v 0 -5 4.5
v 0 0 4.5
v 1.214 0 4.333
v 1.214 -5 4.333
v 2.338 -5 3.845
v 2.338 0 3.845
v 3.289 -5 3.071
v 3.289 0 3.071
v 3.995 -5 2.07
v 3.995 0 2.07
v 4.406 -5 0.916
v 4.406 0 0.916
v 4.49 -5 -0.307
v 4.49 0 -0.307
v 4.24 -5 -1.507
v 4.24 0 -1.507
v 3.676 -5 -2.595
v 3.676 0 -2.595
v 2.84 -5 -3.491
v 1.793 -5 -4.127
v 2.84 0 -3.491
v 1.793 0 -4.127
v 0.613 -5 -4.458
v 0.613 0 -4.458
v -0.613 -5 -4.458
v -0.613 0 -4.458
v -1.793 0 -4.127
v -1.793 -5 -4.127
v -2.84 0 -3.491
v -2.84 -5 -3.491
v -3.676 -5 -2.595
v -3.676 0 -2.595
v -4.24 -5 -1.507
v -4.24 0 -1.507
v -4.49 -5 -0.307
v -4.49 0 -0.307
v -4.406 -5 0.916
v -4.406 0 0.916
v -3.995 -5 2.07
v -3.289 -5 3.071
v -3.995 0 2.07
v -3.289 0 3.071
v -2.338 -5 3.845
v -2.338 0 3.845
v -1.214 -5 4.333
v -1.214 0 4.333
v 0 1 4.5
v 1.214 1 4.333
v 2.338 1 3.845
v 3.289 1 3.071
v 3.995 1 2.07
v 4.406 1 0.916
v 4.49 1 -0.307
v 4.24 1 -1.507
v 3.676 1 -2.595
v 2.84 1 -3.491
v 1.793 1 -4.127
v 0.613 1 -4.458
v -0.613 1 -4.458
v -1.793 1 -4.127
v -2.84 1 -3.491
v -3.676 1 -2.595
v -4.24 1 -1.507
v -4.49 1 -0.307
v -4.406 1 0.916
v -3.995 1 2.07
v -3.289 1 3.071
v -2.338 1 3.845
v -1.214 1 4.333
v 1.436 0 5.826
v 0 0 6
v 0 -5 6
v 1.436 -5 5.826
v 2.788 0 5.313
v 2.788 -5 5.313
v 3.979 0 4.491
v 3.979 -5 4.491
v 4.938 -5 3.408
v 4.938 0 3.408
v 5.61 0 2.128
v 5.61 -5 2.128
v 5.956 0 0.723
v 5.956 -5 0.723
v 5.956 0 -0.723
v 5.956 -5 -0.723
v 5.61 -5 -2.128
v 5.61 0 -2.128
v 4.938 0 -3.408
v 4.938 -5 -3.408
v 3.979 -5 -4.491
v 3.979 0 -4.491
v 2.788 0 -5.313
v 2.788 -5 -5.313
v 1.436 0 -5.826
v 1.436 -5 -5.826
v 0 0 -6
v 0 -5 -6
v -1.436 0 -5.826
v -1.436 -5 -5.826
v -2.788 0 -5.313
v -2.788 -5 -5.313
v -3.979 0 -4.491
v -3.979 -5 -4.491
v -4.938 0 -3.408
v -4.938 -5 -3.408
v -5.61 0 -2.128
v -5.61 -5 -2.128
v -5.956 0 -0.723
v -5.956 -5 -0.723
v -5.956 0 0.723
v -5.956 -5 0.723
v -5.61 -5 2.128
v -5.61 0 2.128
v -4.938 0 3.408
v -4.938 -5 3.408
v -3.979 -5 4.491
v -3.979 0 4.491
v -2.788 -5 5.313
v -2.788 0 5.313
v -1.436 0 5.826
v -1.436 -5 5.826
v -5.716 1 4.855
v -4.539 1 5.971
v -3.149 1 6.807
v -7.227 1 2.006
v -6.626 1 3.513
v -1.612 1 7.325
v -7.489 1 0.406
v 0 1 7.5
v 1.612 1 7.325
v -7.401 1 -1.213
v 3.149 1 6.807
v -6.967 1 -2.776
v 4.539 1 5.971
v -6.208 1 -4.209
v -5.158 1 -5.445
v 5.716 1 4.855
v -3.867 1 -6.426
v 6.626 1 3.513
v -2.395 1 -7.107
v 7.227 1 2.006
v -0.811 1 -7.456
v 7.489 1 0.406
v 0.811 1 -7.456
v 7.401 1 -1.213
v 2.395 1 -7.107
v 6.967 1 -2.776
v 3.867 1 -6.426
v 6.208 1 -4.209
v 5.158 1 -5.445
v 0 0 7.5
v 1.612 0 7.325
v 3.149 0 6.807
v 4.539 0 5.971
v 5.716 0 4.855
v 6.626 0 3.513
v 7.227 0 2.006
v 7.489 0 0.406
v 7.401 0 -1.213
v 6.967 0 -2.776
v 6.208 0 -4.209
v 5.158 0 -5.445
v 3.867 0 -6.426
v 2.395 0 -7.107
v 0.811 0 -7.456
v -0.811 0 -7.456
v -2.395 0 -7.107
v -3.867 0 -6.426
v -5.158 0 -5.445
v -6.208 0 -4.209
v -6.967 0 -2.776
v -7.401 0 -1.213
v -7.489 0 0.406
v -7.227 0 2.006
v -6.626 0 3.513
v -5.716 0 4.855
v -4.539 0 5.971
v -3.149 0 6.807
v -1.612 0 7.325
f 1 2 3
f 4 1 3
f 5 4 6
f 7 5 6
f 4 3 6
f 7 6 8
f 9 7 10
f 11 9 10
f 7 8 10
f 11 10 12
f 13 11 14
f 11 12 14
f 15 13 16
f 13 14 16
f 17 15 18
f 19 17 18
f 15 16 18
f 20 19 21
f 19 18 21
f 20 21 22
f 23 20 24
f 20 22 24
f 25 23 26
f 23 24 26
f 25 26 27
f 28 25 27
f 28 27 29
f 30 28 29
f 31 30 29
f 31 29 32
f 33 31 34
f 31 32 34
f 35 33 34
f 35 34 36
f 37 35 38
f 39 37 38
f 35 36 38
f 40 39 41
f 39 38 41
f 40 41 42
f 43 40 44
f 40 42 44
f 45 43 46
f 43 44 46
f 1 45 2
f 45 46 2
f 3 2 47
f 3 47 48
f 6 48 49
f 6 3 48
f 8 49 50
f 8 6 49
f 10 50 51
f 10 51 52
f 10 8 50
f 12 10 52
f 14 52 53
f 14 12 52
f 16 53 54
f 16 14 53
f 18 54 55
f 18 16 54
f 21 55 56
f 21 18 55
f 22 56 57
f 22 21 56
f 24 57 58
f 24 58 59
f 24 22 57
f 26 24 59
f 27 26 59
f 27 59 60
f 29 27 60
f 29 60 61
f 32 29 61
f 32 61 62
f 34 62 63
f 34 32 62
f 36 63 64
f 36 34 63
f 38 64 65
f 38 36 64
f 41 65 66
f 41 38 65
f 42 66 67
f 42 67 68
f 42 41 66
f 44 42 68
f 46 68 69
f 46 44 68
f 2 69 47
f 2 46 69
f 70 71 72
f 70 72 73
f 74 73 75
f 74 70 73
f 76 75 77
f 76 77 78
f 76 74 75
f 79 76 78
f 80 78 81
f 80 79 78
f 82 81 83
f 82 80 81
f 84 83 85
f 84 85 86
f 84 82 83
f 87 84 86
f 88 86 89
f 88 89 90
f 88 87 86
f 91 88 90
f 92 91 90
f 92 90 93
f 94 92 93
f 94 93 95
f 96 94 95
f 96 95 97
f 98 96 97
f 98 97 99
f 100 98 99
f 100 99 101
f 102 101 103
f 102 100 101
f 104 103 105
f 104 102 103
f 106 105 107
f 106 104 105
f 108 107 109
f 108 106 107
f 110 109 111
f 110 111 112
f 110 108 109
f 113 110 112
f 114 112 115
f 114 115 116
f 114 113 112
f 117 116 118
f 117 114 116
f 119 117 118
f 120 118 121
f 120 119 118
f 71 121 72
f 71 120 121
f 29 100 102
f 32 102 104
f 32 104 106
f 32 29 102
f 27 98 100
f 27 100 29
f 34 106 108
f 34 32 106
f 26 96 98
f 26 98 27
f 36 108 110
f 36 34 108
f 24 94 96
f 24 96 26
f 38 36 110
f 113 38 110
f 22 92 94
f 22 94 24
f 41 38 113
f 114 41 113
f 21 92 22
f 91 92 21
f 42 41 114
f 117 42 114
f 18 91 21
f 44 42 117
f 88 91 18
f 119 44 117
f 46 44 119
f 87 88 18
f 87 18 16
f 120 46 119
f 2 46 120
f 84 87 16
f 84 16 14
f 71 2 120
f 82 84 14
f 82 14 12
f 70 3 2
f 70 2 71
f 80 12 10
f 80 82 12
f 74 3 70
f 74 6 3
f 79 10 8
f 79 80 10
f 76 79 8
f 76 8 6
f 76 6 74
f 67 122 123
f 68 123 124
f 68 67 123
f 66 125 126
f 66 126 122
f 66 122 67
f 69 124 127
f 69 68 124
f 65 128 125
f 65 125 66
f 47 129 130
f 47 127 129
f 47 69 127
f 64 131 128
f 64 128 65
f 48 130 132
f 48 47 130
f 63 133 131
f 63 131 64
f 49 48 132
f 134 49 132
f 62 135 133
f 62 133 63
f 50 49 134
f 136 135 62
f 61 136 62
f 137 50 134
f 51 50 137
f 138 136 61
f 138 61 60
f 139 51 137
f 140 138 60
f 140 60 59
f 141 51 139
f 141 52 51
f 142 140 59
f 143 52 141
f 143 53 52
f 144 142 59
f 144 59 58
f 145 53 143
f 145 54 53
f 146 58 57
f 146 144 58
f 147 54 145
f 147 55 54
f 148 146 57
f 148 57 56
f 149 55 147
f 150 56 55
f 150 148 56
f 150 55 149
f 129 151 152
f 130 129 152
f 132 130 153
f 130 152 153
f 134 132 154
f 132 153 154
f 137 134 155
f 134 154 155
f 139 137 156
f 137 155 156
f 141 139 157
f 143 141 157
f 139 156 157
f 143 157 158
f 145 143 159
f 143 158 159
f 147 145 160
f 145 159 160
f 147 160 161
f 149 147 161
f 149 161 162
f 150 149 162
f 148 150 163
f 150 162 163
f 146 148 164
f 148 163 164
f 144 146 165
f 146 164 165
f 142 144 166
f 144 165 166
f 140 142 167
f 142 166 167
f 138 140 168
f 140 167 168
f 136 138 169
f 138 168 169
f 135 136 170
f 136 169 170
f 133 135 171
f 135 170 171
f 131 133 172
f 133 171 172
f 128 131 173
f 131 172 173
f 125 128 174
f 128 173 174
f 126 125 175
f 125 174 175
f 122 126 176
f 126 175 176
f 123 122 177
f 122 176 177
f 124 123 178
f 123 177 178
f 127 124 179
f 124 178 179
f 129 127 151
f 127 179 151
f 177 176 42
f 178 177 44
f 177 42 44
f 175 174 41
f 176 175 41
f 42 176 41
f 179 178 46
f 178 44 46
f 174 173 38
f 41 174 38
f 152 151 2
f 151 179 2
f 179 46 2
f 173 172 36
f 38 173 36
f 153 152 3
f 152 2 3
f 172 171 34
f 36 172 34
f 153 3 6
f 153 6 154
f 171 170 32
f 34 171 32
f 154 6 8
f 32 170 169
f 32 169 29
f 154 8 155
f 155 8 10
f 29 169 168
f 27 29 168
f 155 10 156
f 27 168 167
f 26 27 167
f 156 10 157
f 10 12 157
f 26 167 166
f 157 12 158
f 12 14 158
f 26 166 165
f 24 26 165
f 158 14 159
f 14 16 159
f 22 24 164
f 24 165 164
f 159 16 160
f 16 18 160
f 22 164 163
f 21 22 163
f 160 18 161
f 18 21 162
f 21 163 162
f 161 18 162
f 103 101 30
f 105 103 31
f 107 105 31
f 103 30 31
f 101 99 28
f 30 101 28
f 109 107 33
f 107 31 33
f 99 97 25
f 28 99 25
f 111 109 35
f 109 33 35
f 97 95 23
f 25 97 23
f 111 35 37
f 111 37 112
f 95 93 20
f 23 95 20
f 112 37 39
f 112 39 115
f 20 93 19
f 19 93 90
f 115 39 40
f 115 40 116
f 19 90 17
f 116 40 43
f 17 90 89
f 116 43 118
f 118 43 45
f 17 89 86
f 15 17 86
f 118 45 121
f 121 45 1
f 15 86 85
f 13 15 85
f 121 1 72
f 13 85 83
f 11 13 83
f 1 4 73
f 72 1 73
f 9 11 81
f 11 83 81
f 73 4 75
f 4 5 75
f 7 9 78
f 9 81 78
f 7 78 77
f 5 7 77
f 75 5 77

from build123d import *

# Parameters (mm, degrees)
SKETCH1_R           = 7.5
SKETCH1_R_2         = 4.5
BOSS_EXTRUDE1_DEPTH = 1
SKETCH1_3_R         = 6
SKETCH1_3_R_2       = 4.5
BOSS_EXTRUDE2_DEPTH = 5


with BuildPart() as part:
    # Sketch1 → Boss-Extrude1 (new body)
    with BuildSketch(Plane(origin=(0, 0, 0), x_dir=(1, 0, 0), z_dir=(0, 1, 0))):
        Circle(SKETCH1_R)
        Circle(SKETCH1_R_2, mode=Mode.SUBTRACT)
    extrude(amount=BOSS_EXTRUDE1_DEPTH)


with BuildPart() as body_2:
    # Sketch1<3> → Boss-Extrude2 (new body)
    with BuildSketch(Plane(origin=(0, 0, 0), x_dir=(1, 0, 0), z_dir=(0, 1, 0))):
        Circle(SKETCH1_3_R)
        Circle(SKETCH1_3_R_2, mode=Mode.SUBTRACT)
    extrude(amount=-BOSS_EXTRUDE2_DEPTH)


solid = Compound([part.part, body_2.part])
